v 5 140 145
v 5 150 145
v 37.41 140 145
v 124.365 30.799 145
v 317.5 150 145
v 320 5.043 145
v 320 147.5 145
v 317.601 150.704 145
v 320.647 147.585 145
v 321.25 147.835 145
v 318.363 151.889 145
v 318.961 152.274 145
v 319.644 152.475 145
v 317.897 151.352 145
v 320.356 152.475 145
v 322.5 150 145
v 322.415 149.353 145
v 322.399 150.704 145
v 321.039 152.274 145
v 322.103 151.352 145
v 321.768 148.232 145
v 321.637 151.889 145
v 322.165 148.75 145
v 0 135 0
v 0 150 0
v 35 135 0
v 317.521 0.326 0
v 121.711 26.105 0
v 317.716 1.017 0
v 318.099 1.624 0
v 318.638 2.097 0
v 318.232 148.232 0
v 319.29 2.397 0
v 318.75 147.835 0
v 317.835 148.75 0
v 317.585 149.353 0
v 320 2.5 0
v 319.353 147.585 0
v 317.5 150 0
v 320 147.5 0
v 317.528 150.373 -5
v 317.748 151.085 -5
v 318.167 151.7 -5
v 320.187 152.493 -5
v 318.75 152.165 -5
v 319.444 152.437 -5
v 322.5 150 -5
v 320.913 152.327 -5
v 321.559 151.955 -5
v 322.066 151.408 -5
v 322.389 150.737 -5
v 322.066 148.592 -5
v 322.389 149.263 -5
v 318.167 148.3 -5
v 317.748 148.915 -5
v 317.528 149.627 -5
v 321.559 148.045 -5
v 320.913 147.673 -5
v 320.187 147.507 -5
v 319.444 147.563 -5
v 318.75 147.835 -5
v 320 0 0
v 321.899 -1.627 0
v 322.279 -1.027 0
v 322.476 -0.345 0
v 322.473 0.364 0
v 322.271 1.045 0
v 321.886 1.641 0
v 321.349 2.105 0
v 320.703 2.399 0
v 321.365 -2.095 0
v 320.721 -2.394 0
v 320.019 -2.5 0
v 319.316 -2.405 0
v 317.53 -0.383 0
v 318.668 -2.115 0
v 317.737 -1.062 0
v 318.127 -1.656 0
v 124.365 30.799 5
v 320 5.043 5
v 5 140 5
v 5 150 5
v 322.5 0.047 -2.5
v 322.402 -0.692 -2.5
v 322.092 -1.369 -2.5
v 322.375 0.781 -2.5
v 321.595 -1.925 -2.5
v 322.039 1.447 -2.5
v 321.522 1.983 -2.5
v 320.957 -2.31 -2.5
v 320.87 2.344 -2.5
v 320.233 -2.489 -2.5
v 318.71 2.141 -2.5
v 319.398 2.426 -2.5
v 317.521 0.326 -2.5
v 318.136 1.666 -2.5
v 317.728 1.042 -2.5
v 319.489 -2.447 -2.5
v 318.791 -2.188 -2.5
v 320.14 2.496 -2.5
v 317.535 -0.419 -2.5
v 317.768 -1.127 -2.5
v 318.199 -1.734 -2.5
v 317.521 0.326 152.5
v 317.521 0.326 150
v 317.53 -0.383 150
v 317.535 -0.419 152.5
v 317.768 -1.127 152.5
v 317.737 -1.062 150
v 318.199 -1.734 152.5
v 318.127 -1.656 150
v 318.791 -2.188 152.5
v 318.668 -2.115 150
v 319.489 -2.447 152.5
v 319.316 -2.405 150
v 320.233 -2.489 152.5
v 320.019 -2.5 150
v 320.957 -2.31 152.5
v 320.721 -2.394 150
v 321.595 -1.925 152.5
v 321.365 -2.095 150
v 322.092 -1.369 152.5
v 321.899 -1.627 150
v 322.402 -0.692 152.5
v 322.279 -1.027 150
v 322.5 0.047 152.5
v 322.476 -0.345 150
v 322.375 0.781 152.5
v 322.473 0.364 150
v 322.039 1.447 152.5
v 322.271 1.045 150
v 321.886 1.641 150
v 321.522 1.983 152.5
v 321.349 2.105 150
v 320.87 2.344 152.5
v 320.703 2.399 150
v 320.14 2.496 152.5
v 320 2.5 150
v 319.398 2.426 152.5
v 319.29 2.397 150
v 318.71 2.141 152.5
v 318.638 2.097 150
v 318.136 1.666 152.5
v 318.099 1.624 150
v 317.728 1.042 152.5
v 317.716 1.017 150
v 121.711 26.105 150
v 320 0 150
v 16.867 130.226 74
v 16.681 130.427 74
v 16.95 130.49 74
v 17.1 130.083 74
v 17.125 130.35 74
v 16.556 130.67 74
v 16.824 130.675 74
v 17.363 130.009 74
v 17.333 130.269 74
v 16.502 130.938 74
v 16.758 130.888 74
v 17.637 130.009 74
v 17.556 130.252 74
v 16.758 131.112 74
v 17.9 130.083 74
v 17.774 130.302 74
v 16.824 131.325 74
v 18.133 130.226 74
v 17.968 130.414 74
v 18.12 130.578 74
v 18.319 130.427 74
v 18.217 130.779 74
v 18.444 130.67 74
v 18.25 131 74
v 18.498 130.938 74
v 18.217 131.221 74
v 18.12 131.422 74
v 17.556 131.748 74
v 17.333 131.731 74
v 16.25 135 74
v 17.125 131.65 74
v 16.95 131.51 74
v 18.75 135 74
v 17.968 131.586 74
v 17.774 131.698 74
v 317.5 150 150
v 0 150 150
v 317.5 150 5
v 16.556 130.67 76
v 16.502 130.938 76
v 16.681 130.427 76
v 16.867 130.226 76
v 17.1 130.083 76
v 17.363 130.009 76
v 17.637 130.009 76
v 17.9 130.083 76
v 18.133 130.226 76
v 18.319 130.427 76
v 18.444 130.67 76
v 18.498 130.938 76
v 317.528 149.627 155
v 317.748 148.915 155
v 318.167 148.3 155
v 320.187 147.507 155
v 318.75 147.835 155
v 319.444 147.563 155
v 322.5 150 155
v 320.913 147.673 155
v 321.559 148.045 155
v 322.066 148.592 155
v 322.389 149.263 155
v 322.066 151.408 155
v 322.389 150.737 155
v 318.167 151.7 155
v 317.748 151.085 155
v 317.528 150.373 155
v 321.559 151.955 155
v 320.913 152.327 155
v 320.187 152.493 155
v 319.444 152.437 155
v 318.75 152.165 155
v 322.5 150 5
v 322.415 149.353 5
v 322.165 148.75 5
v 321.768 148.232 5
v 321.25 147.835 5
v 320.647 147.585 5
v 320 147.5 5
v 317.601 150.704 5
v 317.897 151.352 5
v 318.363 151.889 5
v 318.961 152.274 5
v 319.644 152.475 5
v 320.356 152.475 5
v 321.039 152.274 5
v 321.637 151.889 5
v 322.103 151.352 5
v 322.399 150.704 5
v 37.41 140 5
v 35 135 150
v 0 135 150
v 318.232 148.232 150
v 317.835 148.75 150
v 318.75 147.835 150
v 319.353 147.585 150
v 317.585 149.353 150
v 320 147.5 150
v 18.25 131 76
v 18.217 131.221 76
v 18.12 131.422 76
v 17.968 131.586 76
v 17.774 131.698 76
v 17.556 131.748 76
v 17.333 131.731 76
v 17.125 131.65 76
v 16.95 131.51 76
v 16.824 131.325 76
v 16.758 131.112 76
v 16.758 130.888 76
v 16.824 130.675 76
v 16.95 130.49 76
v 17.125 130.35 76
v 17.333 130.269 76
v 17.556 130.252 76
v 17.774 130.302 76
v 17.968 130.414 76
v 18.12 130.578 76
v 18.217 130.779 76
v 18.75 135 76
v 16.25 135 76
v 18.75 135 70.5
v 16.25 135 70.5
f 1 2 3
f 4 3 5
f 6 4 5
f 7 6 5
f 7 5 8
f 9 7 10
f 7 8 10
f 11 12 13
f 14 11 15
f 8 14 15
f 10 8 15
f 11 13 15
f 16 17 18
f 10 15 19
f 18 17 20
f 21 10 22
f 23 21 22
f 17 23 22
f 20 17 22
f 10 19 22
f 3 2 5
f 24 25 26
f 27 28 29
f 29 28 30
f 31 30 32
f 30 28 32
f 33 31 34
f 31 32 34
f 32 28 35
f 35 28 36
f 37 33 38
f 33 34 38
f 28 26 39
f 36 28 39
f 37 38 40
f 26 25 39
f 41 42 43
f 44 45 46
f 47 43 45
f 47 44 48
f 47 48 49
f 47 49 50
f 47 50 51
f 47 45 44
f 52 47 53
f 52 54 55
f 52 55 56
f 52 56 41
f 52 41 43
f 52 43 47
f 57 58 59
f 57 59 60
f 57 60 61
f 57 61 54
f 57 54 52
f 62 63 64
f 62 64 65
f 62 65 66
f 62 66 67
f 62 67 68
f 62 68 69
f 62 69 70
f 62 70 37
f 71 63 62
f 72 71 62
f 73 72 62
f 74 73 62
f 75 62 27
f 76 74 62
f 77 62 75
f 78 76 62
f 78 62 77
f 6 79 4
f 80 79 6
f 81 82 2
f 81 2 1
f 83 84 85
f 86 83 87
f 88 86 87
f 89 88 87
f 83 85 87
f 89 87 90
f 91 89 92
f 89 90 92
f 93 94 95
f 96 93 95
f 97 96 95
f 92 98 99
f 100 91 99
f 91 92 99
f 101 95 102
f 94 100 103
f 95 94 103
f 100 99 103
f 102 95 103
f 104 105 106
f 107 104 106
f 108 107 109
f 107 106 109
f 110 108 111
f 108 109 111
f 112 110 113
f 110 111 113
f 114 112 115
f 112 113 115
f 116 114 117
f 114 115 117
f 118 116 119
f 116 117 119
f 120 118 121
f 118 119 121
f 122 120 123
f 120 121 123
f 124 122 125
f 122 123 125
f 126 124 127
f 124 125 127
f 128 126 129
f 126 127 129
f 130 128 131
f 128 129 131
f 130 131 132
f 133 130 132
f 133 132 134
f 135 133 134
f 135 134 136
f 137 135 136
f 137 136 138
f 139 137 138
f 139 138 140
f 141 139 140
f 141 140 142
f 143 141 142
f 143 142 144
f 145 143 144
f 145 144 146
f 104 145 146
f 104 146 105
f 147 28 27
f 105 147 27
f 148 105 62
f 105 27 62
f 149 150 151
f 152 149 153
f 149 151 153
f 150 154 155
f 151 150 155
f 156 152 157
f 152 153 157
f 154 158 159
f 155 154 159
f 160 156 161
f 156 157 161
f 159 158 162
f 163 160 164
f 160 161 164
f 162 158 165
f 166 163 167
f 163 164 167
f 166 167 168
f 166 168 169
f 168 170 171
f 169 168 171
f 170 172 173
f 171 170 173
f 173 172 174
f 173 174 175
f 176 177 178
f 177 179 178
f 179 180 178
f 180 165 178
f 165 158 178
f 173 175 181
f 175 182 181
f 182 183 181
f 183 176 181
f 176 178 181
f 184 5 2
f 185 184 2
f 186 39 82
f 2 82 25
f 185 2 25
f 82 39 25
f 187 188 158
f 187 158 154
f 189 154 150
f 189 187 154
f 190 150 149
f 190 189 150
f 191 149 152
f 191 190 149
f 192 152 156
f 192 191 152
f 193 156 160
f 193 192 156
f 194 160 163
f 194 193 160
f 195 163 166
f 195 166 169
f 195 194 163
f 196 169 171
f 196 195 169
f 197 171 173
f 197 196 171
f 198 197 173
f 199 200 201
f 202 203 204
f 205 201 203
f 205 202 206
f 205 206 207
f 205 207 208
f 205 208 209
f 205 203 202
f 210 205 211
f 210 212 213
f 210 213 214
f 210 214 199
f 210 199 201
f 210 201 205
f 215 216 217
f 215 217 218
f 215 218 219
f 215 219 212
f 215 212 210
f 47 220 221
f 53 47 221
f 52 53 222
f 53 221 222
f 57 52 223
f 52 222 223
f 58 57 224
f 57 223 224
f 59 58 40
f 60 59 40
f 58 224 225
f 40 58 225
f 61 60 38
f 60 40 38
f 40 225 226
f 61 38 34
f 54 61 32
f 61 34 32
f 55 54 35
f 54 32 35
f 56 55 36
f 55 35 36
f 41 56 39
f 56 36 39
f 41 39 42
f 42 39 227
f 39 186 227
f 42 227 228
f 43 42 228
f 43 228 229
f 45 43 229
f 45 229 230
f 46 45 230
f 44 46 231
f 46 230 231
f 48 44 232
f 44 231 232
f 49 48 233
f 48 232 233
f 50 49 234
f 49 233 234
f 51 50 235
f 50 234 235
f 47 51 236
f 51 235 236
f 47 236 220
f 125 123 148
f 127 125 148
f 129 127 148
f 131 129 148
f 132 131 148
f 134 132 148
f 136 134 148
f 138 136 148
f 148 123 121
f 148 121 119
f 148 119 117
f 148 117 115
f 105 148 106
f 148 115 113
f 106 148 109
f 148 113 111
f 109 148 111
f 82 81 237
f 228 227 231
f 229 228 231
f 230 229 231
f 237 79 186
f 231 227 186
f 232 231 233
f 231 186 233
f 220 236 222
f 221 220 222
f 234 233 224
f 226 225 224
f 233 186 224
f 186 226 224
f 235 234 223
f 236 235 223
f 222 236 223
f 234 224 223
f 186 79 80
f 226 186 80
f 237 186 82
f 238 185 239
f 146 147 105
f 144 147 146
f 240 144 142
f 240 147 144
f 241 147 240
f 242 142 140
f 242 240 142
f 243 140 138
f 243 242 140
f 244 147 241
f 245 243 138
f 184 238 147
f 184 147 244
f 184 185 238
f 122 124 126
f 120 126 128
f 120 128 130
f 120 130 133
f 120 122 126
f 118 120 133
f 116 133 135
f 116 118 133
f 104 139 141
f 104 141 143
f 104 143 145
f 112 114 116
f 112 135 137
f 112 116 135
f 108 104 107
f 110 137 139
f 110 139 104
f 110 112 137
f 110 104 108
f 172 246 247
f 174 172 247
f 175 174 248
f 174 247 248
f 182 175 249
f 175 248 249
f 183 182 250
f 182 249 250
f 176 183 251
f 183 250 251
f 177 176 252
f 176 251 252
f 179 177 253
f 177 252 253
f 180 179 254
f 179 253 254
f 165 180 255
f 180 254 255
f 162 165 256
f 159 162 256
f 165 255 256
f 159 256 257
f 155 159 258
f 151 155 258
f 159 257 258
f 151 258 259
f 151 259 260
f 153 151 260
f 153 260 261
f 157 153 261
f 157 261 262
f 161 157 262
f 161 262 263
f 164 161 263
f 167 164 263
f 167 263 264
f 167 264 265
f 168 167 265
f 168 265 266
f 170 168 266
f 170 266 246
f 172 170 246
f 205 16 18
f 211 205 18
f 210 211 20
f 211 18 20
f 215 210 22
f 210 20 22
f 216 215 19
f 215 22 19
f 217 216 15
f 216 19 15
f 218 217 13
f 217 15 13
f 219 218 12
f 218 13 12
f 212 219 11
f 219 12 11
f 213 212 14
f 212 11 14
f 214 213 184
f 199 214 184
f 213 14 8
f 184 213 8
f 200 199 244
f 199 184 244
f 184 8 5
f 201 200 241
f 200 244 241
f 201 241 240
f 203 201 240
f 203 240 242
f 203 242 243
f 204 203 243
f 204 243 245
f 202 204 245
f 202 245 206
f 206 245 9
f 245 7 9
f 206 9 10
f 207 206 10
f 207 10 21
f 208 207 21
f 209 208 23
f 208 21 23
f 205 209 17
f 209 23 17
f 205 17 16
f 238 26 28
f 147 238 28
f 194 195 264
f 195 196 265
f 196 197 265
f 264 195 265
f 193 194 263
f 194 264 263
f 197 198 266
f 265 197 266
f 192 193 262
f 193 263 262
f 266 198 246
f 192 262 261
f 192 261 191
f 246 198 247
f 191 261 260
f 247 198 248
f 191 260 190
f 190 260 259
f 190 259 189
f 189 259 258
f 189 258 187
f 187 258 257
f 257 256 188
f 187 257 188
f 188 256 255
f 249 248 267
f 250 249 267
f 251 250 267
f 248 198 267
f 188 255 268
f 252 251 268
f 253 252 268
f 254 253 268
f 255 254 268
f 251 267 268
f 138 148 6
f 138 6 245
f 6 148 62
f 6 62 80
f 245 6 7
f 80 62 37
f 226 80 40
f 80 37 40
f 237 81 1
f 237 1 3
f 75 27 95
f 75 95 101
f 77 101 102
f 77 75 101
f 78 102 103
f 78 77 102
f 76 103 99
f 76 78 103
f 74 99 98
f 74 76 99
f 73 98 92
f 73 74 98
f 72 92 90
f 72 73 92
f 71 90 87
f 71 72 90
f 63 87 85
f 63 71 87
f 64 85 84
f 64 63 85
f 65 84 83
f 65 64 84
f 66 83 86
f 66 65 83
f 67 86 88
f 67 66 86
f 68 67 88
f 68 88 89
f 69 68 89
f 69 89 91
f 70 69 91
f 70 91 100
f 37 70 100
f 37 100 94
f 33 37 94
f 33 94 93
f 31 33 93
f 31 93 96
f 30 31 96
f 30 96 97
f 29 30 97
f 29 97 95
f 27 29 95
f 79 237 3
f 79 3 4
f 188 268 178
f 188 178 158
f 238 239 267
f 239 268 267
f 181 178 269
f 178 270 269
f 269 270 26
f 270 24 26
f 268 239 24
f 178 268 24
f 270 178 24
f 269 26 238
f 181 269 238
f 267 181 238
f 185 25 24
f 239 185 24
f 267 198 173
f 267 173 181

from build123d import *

# Parameters (mm, degrees)
BOSS_EXTRUDE2_DEPTH      = 150
SHELL1_T                 = -5
BOSS_EXTRUDE4_DEPTH      = 5
BOSS_EXTRUDE4_DEPTH_BACK = 5
SKETCH2_R                = 2.5
BOSS_EXTRUDE5_DEPTH      = 5
BOSS_EXTRUDE5_DEPTH_BACK = 5
SKETCH3_R                = 2.5
SKETCH4_R                = 2.5
BOSS_EXTRUDE7_DEPTH      = 2.5
BOSS_EXTRUDE8_DEPTH      = 5.5
SKETCH7_R                = 0.75
CUT_EXTRUDE1_DEPTH       = 5.5


with BuildPart() as part:
    # Sketch1 → Boss-Extrude2 (new body)
    with BuildSketch(Plane.XY):
        Polygon((0, 150), (0, 135), (35, 135), (121.711027725, 26.105238444), (320, 0), (320, 150), align=None)
    extrude(amount=BOSS_EXTRUDE2_DEPTH)

    # Shell1
    shell1_openings = [part.faces().sort_by_distance(p)[0] for p in [
        (160, 150, 75),
        (320, 75, 75),
    ]]
    offset(amount=SHELL1_T, openings=shell1_openings, kind=Kind.INTERSECTION)

    # Sketch2 → Boss-Extrude4 (add, two sides: drawn at the far end of the back side and taken through both)
    with BuildSketch(Plane.XY.offset(150).offset(-BOSS_EXTRUDE4_DEPTH_BACK)):
        with Locations((320, 150)):
            Circle(SKETCH2_R)
    extrude(amount=BOSS_EXTRUDE4_DEPTH + BOSS_EXTRUDE4_DEPTH_BACK)

    # Sketch3 → Boss-Extrude5 (add, two sides: drawn at the far end of the back side and taken through both)
    with BuildSketch(Plane(origin=(0, 0, 0), x_dir=(-1, 0, 0), z_dir=(0, 0, -1)).offset(-BOSS_EXTRUDE5_DEPTH_BACK)):
        with Locations(Location((-320, 150, 0), (0, 0, 180))):
            Circle(SKETCH3_R)
    extrude(amount=BOSS_EXTRUDE5_DEPTH + BOSS_EXTRUDE5_DEPTH_BACK)

    # Sketch4 → Boss-Extrude7 (add)
    with BuildSketch(Plane.XY.offset(150)):
        with Locations(Location((320, 0, 0), (0, 0, 172.5))):
            Circle(SKETCH4_R)
    boss_extrude7 = extrude(amount=BOSS_EXTRUDE7_DEPTH)

    # Mirror1: Boss-Extrude7 across plane
    add(boss_extrude7.mirror(Plane.XY.offset(75)))

    # Sketch6 → Boss-Extrude8 (add)
    with BuildSketch(Plane.XZ.offset(-135)):
        Polygon((17.733333333, 74), (17.266666667, 76), (16.25, 76), (16.25, 74), align=None)
        Polygon((18.75, 76), (17.266666667, 76), (17.733333333, 74), (18.75, 74), align=None)
    extrude(amount=BOSS_EXTRUDE8_DEPTH)

    # Sketch7 → Cut-Extrude1 (cut)
    with BuildSketch(Plane.XY.offset(76)):
        with Locations((17.5, 131)):
            Circle(SKETCH7_R)
        with BuildLine():
            Line((16.25, 135), (16.501917688, 130.938099278))
            ThreePointArc((16.501917688, 130.938099278), (17.5, 130), (18.498082312, 130.938099278))
            Line((18.498082312, 130.938099278), (18.75, 135))
            Line((18.75, 135), (18.75, 129.5))
            Line((18.75, 129.5), (16.25, 129.5))
            Line((16.25, 129.5), (16.25, 135))
        make_face()
    extrude(amount=-CUT_EXTRUDE1_DEPTH, mode=Mode.SUBTRACT)


solid = part.part
